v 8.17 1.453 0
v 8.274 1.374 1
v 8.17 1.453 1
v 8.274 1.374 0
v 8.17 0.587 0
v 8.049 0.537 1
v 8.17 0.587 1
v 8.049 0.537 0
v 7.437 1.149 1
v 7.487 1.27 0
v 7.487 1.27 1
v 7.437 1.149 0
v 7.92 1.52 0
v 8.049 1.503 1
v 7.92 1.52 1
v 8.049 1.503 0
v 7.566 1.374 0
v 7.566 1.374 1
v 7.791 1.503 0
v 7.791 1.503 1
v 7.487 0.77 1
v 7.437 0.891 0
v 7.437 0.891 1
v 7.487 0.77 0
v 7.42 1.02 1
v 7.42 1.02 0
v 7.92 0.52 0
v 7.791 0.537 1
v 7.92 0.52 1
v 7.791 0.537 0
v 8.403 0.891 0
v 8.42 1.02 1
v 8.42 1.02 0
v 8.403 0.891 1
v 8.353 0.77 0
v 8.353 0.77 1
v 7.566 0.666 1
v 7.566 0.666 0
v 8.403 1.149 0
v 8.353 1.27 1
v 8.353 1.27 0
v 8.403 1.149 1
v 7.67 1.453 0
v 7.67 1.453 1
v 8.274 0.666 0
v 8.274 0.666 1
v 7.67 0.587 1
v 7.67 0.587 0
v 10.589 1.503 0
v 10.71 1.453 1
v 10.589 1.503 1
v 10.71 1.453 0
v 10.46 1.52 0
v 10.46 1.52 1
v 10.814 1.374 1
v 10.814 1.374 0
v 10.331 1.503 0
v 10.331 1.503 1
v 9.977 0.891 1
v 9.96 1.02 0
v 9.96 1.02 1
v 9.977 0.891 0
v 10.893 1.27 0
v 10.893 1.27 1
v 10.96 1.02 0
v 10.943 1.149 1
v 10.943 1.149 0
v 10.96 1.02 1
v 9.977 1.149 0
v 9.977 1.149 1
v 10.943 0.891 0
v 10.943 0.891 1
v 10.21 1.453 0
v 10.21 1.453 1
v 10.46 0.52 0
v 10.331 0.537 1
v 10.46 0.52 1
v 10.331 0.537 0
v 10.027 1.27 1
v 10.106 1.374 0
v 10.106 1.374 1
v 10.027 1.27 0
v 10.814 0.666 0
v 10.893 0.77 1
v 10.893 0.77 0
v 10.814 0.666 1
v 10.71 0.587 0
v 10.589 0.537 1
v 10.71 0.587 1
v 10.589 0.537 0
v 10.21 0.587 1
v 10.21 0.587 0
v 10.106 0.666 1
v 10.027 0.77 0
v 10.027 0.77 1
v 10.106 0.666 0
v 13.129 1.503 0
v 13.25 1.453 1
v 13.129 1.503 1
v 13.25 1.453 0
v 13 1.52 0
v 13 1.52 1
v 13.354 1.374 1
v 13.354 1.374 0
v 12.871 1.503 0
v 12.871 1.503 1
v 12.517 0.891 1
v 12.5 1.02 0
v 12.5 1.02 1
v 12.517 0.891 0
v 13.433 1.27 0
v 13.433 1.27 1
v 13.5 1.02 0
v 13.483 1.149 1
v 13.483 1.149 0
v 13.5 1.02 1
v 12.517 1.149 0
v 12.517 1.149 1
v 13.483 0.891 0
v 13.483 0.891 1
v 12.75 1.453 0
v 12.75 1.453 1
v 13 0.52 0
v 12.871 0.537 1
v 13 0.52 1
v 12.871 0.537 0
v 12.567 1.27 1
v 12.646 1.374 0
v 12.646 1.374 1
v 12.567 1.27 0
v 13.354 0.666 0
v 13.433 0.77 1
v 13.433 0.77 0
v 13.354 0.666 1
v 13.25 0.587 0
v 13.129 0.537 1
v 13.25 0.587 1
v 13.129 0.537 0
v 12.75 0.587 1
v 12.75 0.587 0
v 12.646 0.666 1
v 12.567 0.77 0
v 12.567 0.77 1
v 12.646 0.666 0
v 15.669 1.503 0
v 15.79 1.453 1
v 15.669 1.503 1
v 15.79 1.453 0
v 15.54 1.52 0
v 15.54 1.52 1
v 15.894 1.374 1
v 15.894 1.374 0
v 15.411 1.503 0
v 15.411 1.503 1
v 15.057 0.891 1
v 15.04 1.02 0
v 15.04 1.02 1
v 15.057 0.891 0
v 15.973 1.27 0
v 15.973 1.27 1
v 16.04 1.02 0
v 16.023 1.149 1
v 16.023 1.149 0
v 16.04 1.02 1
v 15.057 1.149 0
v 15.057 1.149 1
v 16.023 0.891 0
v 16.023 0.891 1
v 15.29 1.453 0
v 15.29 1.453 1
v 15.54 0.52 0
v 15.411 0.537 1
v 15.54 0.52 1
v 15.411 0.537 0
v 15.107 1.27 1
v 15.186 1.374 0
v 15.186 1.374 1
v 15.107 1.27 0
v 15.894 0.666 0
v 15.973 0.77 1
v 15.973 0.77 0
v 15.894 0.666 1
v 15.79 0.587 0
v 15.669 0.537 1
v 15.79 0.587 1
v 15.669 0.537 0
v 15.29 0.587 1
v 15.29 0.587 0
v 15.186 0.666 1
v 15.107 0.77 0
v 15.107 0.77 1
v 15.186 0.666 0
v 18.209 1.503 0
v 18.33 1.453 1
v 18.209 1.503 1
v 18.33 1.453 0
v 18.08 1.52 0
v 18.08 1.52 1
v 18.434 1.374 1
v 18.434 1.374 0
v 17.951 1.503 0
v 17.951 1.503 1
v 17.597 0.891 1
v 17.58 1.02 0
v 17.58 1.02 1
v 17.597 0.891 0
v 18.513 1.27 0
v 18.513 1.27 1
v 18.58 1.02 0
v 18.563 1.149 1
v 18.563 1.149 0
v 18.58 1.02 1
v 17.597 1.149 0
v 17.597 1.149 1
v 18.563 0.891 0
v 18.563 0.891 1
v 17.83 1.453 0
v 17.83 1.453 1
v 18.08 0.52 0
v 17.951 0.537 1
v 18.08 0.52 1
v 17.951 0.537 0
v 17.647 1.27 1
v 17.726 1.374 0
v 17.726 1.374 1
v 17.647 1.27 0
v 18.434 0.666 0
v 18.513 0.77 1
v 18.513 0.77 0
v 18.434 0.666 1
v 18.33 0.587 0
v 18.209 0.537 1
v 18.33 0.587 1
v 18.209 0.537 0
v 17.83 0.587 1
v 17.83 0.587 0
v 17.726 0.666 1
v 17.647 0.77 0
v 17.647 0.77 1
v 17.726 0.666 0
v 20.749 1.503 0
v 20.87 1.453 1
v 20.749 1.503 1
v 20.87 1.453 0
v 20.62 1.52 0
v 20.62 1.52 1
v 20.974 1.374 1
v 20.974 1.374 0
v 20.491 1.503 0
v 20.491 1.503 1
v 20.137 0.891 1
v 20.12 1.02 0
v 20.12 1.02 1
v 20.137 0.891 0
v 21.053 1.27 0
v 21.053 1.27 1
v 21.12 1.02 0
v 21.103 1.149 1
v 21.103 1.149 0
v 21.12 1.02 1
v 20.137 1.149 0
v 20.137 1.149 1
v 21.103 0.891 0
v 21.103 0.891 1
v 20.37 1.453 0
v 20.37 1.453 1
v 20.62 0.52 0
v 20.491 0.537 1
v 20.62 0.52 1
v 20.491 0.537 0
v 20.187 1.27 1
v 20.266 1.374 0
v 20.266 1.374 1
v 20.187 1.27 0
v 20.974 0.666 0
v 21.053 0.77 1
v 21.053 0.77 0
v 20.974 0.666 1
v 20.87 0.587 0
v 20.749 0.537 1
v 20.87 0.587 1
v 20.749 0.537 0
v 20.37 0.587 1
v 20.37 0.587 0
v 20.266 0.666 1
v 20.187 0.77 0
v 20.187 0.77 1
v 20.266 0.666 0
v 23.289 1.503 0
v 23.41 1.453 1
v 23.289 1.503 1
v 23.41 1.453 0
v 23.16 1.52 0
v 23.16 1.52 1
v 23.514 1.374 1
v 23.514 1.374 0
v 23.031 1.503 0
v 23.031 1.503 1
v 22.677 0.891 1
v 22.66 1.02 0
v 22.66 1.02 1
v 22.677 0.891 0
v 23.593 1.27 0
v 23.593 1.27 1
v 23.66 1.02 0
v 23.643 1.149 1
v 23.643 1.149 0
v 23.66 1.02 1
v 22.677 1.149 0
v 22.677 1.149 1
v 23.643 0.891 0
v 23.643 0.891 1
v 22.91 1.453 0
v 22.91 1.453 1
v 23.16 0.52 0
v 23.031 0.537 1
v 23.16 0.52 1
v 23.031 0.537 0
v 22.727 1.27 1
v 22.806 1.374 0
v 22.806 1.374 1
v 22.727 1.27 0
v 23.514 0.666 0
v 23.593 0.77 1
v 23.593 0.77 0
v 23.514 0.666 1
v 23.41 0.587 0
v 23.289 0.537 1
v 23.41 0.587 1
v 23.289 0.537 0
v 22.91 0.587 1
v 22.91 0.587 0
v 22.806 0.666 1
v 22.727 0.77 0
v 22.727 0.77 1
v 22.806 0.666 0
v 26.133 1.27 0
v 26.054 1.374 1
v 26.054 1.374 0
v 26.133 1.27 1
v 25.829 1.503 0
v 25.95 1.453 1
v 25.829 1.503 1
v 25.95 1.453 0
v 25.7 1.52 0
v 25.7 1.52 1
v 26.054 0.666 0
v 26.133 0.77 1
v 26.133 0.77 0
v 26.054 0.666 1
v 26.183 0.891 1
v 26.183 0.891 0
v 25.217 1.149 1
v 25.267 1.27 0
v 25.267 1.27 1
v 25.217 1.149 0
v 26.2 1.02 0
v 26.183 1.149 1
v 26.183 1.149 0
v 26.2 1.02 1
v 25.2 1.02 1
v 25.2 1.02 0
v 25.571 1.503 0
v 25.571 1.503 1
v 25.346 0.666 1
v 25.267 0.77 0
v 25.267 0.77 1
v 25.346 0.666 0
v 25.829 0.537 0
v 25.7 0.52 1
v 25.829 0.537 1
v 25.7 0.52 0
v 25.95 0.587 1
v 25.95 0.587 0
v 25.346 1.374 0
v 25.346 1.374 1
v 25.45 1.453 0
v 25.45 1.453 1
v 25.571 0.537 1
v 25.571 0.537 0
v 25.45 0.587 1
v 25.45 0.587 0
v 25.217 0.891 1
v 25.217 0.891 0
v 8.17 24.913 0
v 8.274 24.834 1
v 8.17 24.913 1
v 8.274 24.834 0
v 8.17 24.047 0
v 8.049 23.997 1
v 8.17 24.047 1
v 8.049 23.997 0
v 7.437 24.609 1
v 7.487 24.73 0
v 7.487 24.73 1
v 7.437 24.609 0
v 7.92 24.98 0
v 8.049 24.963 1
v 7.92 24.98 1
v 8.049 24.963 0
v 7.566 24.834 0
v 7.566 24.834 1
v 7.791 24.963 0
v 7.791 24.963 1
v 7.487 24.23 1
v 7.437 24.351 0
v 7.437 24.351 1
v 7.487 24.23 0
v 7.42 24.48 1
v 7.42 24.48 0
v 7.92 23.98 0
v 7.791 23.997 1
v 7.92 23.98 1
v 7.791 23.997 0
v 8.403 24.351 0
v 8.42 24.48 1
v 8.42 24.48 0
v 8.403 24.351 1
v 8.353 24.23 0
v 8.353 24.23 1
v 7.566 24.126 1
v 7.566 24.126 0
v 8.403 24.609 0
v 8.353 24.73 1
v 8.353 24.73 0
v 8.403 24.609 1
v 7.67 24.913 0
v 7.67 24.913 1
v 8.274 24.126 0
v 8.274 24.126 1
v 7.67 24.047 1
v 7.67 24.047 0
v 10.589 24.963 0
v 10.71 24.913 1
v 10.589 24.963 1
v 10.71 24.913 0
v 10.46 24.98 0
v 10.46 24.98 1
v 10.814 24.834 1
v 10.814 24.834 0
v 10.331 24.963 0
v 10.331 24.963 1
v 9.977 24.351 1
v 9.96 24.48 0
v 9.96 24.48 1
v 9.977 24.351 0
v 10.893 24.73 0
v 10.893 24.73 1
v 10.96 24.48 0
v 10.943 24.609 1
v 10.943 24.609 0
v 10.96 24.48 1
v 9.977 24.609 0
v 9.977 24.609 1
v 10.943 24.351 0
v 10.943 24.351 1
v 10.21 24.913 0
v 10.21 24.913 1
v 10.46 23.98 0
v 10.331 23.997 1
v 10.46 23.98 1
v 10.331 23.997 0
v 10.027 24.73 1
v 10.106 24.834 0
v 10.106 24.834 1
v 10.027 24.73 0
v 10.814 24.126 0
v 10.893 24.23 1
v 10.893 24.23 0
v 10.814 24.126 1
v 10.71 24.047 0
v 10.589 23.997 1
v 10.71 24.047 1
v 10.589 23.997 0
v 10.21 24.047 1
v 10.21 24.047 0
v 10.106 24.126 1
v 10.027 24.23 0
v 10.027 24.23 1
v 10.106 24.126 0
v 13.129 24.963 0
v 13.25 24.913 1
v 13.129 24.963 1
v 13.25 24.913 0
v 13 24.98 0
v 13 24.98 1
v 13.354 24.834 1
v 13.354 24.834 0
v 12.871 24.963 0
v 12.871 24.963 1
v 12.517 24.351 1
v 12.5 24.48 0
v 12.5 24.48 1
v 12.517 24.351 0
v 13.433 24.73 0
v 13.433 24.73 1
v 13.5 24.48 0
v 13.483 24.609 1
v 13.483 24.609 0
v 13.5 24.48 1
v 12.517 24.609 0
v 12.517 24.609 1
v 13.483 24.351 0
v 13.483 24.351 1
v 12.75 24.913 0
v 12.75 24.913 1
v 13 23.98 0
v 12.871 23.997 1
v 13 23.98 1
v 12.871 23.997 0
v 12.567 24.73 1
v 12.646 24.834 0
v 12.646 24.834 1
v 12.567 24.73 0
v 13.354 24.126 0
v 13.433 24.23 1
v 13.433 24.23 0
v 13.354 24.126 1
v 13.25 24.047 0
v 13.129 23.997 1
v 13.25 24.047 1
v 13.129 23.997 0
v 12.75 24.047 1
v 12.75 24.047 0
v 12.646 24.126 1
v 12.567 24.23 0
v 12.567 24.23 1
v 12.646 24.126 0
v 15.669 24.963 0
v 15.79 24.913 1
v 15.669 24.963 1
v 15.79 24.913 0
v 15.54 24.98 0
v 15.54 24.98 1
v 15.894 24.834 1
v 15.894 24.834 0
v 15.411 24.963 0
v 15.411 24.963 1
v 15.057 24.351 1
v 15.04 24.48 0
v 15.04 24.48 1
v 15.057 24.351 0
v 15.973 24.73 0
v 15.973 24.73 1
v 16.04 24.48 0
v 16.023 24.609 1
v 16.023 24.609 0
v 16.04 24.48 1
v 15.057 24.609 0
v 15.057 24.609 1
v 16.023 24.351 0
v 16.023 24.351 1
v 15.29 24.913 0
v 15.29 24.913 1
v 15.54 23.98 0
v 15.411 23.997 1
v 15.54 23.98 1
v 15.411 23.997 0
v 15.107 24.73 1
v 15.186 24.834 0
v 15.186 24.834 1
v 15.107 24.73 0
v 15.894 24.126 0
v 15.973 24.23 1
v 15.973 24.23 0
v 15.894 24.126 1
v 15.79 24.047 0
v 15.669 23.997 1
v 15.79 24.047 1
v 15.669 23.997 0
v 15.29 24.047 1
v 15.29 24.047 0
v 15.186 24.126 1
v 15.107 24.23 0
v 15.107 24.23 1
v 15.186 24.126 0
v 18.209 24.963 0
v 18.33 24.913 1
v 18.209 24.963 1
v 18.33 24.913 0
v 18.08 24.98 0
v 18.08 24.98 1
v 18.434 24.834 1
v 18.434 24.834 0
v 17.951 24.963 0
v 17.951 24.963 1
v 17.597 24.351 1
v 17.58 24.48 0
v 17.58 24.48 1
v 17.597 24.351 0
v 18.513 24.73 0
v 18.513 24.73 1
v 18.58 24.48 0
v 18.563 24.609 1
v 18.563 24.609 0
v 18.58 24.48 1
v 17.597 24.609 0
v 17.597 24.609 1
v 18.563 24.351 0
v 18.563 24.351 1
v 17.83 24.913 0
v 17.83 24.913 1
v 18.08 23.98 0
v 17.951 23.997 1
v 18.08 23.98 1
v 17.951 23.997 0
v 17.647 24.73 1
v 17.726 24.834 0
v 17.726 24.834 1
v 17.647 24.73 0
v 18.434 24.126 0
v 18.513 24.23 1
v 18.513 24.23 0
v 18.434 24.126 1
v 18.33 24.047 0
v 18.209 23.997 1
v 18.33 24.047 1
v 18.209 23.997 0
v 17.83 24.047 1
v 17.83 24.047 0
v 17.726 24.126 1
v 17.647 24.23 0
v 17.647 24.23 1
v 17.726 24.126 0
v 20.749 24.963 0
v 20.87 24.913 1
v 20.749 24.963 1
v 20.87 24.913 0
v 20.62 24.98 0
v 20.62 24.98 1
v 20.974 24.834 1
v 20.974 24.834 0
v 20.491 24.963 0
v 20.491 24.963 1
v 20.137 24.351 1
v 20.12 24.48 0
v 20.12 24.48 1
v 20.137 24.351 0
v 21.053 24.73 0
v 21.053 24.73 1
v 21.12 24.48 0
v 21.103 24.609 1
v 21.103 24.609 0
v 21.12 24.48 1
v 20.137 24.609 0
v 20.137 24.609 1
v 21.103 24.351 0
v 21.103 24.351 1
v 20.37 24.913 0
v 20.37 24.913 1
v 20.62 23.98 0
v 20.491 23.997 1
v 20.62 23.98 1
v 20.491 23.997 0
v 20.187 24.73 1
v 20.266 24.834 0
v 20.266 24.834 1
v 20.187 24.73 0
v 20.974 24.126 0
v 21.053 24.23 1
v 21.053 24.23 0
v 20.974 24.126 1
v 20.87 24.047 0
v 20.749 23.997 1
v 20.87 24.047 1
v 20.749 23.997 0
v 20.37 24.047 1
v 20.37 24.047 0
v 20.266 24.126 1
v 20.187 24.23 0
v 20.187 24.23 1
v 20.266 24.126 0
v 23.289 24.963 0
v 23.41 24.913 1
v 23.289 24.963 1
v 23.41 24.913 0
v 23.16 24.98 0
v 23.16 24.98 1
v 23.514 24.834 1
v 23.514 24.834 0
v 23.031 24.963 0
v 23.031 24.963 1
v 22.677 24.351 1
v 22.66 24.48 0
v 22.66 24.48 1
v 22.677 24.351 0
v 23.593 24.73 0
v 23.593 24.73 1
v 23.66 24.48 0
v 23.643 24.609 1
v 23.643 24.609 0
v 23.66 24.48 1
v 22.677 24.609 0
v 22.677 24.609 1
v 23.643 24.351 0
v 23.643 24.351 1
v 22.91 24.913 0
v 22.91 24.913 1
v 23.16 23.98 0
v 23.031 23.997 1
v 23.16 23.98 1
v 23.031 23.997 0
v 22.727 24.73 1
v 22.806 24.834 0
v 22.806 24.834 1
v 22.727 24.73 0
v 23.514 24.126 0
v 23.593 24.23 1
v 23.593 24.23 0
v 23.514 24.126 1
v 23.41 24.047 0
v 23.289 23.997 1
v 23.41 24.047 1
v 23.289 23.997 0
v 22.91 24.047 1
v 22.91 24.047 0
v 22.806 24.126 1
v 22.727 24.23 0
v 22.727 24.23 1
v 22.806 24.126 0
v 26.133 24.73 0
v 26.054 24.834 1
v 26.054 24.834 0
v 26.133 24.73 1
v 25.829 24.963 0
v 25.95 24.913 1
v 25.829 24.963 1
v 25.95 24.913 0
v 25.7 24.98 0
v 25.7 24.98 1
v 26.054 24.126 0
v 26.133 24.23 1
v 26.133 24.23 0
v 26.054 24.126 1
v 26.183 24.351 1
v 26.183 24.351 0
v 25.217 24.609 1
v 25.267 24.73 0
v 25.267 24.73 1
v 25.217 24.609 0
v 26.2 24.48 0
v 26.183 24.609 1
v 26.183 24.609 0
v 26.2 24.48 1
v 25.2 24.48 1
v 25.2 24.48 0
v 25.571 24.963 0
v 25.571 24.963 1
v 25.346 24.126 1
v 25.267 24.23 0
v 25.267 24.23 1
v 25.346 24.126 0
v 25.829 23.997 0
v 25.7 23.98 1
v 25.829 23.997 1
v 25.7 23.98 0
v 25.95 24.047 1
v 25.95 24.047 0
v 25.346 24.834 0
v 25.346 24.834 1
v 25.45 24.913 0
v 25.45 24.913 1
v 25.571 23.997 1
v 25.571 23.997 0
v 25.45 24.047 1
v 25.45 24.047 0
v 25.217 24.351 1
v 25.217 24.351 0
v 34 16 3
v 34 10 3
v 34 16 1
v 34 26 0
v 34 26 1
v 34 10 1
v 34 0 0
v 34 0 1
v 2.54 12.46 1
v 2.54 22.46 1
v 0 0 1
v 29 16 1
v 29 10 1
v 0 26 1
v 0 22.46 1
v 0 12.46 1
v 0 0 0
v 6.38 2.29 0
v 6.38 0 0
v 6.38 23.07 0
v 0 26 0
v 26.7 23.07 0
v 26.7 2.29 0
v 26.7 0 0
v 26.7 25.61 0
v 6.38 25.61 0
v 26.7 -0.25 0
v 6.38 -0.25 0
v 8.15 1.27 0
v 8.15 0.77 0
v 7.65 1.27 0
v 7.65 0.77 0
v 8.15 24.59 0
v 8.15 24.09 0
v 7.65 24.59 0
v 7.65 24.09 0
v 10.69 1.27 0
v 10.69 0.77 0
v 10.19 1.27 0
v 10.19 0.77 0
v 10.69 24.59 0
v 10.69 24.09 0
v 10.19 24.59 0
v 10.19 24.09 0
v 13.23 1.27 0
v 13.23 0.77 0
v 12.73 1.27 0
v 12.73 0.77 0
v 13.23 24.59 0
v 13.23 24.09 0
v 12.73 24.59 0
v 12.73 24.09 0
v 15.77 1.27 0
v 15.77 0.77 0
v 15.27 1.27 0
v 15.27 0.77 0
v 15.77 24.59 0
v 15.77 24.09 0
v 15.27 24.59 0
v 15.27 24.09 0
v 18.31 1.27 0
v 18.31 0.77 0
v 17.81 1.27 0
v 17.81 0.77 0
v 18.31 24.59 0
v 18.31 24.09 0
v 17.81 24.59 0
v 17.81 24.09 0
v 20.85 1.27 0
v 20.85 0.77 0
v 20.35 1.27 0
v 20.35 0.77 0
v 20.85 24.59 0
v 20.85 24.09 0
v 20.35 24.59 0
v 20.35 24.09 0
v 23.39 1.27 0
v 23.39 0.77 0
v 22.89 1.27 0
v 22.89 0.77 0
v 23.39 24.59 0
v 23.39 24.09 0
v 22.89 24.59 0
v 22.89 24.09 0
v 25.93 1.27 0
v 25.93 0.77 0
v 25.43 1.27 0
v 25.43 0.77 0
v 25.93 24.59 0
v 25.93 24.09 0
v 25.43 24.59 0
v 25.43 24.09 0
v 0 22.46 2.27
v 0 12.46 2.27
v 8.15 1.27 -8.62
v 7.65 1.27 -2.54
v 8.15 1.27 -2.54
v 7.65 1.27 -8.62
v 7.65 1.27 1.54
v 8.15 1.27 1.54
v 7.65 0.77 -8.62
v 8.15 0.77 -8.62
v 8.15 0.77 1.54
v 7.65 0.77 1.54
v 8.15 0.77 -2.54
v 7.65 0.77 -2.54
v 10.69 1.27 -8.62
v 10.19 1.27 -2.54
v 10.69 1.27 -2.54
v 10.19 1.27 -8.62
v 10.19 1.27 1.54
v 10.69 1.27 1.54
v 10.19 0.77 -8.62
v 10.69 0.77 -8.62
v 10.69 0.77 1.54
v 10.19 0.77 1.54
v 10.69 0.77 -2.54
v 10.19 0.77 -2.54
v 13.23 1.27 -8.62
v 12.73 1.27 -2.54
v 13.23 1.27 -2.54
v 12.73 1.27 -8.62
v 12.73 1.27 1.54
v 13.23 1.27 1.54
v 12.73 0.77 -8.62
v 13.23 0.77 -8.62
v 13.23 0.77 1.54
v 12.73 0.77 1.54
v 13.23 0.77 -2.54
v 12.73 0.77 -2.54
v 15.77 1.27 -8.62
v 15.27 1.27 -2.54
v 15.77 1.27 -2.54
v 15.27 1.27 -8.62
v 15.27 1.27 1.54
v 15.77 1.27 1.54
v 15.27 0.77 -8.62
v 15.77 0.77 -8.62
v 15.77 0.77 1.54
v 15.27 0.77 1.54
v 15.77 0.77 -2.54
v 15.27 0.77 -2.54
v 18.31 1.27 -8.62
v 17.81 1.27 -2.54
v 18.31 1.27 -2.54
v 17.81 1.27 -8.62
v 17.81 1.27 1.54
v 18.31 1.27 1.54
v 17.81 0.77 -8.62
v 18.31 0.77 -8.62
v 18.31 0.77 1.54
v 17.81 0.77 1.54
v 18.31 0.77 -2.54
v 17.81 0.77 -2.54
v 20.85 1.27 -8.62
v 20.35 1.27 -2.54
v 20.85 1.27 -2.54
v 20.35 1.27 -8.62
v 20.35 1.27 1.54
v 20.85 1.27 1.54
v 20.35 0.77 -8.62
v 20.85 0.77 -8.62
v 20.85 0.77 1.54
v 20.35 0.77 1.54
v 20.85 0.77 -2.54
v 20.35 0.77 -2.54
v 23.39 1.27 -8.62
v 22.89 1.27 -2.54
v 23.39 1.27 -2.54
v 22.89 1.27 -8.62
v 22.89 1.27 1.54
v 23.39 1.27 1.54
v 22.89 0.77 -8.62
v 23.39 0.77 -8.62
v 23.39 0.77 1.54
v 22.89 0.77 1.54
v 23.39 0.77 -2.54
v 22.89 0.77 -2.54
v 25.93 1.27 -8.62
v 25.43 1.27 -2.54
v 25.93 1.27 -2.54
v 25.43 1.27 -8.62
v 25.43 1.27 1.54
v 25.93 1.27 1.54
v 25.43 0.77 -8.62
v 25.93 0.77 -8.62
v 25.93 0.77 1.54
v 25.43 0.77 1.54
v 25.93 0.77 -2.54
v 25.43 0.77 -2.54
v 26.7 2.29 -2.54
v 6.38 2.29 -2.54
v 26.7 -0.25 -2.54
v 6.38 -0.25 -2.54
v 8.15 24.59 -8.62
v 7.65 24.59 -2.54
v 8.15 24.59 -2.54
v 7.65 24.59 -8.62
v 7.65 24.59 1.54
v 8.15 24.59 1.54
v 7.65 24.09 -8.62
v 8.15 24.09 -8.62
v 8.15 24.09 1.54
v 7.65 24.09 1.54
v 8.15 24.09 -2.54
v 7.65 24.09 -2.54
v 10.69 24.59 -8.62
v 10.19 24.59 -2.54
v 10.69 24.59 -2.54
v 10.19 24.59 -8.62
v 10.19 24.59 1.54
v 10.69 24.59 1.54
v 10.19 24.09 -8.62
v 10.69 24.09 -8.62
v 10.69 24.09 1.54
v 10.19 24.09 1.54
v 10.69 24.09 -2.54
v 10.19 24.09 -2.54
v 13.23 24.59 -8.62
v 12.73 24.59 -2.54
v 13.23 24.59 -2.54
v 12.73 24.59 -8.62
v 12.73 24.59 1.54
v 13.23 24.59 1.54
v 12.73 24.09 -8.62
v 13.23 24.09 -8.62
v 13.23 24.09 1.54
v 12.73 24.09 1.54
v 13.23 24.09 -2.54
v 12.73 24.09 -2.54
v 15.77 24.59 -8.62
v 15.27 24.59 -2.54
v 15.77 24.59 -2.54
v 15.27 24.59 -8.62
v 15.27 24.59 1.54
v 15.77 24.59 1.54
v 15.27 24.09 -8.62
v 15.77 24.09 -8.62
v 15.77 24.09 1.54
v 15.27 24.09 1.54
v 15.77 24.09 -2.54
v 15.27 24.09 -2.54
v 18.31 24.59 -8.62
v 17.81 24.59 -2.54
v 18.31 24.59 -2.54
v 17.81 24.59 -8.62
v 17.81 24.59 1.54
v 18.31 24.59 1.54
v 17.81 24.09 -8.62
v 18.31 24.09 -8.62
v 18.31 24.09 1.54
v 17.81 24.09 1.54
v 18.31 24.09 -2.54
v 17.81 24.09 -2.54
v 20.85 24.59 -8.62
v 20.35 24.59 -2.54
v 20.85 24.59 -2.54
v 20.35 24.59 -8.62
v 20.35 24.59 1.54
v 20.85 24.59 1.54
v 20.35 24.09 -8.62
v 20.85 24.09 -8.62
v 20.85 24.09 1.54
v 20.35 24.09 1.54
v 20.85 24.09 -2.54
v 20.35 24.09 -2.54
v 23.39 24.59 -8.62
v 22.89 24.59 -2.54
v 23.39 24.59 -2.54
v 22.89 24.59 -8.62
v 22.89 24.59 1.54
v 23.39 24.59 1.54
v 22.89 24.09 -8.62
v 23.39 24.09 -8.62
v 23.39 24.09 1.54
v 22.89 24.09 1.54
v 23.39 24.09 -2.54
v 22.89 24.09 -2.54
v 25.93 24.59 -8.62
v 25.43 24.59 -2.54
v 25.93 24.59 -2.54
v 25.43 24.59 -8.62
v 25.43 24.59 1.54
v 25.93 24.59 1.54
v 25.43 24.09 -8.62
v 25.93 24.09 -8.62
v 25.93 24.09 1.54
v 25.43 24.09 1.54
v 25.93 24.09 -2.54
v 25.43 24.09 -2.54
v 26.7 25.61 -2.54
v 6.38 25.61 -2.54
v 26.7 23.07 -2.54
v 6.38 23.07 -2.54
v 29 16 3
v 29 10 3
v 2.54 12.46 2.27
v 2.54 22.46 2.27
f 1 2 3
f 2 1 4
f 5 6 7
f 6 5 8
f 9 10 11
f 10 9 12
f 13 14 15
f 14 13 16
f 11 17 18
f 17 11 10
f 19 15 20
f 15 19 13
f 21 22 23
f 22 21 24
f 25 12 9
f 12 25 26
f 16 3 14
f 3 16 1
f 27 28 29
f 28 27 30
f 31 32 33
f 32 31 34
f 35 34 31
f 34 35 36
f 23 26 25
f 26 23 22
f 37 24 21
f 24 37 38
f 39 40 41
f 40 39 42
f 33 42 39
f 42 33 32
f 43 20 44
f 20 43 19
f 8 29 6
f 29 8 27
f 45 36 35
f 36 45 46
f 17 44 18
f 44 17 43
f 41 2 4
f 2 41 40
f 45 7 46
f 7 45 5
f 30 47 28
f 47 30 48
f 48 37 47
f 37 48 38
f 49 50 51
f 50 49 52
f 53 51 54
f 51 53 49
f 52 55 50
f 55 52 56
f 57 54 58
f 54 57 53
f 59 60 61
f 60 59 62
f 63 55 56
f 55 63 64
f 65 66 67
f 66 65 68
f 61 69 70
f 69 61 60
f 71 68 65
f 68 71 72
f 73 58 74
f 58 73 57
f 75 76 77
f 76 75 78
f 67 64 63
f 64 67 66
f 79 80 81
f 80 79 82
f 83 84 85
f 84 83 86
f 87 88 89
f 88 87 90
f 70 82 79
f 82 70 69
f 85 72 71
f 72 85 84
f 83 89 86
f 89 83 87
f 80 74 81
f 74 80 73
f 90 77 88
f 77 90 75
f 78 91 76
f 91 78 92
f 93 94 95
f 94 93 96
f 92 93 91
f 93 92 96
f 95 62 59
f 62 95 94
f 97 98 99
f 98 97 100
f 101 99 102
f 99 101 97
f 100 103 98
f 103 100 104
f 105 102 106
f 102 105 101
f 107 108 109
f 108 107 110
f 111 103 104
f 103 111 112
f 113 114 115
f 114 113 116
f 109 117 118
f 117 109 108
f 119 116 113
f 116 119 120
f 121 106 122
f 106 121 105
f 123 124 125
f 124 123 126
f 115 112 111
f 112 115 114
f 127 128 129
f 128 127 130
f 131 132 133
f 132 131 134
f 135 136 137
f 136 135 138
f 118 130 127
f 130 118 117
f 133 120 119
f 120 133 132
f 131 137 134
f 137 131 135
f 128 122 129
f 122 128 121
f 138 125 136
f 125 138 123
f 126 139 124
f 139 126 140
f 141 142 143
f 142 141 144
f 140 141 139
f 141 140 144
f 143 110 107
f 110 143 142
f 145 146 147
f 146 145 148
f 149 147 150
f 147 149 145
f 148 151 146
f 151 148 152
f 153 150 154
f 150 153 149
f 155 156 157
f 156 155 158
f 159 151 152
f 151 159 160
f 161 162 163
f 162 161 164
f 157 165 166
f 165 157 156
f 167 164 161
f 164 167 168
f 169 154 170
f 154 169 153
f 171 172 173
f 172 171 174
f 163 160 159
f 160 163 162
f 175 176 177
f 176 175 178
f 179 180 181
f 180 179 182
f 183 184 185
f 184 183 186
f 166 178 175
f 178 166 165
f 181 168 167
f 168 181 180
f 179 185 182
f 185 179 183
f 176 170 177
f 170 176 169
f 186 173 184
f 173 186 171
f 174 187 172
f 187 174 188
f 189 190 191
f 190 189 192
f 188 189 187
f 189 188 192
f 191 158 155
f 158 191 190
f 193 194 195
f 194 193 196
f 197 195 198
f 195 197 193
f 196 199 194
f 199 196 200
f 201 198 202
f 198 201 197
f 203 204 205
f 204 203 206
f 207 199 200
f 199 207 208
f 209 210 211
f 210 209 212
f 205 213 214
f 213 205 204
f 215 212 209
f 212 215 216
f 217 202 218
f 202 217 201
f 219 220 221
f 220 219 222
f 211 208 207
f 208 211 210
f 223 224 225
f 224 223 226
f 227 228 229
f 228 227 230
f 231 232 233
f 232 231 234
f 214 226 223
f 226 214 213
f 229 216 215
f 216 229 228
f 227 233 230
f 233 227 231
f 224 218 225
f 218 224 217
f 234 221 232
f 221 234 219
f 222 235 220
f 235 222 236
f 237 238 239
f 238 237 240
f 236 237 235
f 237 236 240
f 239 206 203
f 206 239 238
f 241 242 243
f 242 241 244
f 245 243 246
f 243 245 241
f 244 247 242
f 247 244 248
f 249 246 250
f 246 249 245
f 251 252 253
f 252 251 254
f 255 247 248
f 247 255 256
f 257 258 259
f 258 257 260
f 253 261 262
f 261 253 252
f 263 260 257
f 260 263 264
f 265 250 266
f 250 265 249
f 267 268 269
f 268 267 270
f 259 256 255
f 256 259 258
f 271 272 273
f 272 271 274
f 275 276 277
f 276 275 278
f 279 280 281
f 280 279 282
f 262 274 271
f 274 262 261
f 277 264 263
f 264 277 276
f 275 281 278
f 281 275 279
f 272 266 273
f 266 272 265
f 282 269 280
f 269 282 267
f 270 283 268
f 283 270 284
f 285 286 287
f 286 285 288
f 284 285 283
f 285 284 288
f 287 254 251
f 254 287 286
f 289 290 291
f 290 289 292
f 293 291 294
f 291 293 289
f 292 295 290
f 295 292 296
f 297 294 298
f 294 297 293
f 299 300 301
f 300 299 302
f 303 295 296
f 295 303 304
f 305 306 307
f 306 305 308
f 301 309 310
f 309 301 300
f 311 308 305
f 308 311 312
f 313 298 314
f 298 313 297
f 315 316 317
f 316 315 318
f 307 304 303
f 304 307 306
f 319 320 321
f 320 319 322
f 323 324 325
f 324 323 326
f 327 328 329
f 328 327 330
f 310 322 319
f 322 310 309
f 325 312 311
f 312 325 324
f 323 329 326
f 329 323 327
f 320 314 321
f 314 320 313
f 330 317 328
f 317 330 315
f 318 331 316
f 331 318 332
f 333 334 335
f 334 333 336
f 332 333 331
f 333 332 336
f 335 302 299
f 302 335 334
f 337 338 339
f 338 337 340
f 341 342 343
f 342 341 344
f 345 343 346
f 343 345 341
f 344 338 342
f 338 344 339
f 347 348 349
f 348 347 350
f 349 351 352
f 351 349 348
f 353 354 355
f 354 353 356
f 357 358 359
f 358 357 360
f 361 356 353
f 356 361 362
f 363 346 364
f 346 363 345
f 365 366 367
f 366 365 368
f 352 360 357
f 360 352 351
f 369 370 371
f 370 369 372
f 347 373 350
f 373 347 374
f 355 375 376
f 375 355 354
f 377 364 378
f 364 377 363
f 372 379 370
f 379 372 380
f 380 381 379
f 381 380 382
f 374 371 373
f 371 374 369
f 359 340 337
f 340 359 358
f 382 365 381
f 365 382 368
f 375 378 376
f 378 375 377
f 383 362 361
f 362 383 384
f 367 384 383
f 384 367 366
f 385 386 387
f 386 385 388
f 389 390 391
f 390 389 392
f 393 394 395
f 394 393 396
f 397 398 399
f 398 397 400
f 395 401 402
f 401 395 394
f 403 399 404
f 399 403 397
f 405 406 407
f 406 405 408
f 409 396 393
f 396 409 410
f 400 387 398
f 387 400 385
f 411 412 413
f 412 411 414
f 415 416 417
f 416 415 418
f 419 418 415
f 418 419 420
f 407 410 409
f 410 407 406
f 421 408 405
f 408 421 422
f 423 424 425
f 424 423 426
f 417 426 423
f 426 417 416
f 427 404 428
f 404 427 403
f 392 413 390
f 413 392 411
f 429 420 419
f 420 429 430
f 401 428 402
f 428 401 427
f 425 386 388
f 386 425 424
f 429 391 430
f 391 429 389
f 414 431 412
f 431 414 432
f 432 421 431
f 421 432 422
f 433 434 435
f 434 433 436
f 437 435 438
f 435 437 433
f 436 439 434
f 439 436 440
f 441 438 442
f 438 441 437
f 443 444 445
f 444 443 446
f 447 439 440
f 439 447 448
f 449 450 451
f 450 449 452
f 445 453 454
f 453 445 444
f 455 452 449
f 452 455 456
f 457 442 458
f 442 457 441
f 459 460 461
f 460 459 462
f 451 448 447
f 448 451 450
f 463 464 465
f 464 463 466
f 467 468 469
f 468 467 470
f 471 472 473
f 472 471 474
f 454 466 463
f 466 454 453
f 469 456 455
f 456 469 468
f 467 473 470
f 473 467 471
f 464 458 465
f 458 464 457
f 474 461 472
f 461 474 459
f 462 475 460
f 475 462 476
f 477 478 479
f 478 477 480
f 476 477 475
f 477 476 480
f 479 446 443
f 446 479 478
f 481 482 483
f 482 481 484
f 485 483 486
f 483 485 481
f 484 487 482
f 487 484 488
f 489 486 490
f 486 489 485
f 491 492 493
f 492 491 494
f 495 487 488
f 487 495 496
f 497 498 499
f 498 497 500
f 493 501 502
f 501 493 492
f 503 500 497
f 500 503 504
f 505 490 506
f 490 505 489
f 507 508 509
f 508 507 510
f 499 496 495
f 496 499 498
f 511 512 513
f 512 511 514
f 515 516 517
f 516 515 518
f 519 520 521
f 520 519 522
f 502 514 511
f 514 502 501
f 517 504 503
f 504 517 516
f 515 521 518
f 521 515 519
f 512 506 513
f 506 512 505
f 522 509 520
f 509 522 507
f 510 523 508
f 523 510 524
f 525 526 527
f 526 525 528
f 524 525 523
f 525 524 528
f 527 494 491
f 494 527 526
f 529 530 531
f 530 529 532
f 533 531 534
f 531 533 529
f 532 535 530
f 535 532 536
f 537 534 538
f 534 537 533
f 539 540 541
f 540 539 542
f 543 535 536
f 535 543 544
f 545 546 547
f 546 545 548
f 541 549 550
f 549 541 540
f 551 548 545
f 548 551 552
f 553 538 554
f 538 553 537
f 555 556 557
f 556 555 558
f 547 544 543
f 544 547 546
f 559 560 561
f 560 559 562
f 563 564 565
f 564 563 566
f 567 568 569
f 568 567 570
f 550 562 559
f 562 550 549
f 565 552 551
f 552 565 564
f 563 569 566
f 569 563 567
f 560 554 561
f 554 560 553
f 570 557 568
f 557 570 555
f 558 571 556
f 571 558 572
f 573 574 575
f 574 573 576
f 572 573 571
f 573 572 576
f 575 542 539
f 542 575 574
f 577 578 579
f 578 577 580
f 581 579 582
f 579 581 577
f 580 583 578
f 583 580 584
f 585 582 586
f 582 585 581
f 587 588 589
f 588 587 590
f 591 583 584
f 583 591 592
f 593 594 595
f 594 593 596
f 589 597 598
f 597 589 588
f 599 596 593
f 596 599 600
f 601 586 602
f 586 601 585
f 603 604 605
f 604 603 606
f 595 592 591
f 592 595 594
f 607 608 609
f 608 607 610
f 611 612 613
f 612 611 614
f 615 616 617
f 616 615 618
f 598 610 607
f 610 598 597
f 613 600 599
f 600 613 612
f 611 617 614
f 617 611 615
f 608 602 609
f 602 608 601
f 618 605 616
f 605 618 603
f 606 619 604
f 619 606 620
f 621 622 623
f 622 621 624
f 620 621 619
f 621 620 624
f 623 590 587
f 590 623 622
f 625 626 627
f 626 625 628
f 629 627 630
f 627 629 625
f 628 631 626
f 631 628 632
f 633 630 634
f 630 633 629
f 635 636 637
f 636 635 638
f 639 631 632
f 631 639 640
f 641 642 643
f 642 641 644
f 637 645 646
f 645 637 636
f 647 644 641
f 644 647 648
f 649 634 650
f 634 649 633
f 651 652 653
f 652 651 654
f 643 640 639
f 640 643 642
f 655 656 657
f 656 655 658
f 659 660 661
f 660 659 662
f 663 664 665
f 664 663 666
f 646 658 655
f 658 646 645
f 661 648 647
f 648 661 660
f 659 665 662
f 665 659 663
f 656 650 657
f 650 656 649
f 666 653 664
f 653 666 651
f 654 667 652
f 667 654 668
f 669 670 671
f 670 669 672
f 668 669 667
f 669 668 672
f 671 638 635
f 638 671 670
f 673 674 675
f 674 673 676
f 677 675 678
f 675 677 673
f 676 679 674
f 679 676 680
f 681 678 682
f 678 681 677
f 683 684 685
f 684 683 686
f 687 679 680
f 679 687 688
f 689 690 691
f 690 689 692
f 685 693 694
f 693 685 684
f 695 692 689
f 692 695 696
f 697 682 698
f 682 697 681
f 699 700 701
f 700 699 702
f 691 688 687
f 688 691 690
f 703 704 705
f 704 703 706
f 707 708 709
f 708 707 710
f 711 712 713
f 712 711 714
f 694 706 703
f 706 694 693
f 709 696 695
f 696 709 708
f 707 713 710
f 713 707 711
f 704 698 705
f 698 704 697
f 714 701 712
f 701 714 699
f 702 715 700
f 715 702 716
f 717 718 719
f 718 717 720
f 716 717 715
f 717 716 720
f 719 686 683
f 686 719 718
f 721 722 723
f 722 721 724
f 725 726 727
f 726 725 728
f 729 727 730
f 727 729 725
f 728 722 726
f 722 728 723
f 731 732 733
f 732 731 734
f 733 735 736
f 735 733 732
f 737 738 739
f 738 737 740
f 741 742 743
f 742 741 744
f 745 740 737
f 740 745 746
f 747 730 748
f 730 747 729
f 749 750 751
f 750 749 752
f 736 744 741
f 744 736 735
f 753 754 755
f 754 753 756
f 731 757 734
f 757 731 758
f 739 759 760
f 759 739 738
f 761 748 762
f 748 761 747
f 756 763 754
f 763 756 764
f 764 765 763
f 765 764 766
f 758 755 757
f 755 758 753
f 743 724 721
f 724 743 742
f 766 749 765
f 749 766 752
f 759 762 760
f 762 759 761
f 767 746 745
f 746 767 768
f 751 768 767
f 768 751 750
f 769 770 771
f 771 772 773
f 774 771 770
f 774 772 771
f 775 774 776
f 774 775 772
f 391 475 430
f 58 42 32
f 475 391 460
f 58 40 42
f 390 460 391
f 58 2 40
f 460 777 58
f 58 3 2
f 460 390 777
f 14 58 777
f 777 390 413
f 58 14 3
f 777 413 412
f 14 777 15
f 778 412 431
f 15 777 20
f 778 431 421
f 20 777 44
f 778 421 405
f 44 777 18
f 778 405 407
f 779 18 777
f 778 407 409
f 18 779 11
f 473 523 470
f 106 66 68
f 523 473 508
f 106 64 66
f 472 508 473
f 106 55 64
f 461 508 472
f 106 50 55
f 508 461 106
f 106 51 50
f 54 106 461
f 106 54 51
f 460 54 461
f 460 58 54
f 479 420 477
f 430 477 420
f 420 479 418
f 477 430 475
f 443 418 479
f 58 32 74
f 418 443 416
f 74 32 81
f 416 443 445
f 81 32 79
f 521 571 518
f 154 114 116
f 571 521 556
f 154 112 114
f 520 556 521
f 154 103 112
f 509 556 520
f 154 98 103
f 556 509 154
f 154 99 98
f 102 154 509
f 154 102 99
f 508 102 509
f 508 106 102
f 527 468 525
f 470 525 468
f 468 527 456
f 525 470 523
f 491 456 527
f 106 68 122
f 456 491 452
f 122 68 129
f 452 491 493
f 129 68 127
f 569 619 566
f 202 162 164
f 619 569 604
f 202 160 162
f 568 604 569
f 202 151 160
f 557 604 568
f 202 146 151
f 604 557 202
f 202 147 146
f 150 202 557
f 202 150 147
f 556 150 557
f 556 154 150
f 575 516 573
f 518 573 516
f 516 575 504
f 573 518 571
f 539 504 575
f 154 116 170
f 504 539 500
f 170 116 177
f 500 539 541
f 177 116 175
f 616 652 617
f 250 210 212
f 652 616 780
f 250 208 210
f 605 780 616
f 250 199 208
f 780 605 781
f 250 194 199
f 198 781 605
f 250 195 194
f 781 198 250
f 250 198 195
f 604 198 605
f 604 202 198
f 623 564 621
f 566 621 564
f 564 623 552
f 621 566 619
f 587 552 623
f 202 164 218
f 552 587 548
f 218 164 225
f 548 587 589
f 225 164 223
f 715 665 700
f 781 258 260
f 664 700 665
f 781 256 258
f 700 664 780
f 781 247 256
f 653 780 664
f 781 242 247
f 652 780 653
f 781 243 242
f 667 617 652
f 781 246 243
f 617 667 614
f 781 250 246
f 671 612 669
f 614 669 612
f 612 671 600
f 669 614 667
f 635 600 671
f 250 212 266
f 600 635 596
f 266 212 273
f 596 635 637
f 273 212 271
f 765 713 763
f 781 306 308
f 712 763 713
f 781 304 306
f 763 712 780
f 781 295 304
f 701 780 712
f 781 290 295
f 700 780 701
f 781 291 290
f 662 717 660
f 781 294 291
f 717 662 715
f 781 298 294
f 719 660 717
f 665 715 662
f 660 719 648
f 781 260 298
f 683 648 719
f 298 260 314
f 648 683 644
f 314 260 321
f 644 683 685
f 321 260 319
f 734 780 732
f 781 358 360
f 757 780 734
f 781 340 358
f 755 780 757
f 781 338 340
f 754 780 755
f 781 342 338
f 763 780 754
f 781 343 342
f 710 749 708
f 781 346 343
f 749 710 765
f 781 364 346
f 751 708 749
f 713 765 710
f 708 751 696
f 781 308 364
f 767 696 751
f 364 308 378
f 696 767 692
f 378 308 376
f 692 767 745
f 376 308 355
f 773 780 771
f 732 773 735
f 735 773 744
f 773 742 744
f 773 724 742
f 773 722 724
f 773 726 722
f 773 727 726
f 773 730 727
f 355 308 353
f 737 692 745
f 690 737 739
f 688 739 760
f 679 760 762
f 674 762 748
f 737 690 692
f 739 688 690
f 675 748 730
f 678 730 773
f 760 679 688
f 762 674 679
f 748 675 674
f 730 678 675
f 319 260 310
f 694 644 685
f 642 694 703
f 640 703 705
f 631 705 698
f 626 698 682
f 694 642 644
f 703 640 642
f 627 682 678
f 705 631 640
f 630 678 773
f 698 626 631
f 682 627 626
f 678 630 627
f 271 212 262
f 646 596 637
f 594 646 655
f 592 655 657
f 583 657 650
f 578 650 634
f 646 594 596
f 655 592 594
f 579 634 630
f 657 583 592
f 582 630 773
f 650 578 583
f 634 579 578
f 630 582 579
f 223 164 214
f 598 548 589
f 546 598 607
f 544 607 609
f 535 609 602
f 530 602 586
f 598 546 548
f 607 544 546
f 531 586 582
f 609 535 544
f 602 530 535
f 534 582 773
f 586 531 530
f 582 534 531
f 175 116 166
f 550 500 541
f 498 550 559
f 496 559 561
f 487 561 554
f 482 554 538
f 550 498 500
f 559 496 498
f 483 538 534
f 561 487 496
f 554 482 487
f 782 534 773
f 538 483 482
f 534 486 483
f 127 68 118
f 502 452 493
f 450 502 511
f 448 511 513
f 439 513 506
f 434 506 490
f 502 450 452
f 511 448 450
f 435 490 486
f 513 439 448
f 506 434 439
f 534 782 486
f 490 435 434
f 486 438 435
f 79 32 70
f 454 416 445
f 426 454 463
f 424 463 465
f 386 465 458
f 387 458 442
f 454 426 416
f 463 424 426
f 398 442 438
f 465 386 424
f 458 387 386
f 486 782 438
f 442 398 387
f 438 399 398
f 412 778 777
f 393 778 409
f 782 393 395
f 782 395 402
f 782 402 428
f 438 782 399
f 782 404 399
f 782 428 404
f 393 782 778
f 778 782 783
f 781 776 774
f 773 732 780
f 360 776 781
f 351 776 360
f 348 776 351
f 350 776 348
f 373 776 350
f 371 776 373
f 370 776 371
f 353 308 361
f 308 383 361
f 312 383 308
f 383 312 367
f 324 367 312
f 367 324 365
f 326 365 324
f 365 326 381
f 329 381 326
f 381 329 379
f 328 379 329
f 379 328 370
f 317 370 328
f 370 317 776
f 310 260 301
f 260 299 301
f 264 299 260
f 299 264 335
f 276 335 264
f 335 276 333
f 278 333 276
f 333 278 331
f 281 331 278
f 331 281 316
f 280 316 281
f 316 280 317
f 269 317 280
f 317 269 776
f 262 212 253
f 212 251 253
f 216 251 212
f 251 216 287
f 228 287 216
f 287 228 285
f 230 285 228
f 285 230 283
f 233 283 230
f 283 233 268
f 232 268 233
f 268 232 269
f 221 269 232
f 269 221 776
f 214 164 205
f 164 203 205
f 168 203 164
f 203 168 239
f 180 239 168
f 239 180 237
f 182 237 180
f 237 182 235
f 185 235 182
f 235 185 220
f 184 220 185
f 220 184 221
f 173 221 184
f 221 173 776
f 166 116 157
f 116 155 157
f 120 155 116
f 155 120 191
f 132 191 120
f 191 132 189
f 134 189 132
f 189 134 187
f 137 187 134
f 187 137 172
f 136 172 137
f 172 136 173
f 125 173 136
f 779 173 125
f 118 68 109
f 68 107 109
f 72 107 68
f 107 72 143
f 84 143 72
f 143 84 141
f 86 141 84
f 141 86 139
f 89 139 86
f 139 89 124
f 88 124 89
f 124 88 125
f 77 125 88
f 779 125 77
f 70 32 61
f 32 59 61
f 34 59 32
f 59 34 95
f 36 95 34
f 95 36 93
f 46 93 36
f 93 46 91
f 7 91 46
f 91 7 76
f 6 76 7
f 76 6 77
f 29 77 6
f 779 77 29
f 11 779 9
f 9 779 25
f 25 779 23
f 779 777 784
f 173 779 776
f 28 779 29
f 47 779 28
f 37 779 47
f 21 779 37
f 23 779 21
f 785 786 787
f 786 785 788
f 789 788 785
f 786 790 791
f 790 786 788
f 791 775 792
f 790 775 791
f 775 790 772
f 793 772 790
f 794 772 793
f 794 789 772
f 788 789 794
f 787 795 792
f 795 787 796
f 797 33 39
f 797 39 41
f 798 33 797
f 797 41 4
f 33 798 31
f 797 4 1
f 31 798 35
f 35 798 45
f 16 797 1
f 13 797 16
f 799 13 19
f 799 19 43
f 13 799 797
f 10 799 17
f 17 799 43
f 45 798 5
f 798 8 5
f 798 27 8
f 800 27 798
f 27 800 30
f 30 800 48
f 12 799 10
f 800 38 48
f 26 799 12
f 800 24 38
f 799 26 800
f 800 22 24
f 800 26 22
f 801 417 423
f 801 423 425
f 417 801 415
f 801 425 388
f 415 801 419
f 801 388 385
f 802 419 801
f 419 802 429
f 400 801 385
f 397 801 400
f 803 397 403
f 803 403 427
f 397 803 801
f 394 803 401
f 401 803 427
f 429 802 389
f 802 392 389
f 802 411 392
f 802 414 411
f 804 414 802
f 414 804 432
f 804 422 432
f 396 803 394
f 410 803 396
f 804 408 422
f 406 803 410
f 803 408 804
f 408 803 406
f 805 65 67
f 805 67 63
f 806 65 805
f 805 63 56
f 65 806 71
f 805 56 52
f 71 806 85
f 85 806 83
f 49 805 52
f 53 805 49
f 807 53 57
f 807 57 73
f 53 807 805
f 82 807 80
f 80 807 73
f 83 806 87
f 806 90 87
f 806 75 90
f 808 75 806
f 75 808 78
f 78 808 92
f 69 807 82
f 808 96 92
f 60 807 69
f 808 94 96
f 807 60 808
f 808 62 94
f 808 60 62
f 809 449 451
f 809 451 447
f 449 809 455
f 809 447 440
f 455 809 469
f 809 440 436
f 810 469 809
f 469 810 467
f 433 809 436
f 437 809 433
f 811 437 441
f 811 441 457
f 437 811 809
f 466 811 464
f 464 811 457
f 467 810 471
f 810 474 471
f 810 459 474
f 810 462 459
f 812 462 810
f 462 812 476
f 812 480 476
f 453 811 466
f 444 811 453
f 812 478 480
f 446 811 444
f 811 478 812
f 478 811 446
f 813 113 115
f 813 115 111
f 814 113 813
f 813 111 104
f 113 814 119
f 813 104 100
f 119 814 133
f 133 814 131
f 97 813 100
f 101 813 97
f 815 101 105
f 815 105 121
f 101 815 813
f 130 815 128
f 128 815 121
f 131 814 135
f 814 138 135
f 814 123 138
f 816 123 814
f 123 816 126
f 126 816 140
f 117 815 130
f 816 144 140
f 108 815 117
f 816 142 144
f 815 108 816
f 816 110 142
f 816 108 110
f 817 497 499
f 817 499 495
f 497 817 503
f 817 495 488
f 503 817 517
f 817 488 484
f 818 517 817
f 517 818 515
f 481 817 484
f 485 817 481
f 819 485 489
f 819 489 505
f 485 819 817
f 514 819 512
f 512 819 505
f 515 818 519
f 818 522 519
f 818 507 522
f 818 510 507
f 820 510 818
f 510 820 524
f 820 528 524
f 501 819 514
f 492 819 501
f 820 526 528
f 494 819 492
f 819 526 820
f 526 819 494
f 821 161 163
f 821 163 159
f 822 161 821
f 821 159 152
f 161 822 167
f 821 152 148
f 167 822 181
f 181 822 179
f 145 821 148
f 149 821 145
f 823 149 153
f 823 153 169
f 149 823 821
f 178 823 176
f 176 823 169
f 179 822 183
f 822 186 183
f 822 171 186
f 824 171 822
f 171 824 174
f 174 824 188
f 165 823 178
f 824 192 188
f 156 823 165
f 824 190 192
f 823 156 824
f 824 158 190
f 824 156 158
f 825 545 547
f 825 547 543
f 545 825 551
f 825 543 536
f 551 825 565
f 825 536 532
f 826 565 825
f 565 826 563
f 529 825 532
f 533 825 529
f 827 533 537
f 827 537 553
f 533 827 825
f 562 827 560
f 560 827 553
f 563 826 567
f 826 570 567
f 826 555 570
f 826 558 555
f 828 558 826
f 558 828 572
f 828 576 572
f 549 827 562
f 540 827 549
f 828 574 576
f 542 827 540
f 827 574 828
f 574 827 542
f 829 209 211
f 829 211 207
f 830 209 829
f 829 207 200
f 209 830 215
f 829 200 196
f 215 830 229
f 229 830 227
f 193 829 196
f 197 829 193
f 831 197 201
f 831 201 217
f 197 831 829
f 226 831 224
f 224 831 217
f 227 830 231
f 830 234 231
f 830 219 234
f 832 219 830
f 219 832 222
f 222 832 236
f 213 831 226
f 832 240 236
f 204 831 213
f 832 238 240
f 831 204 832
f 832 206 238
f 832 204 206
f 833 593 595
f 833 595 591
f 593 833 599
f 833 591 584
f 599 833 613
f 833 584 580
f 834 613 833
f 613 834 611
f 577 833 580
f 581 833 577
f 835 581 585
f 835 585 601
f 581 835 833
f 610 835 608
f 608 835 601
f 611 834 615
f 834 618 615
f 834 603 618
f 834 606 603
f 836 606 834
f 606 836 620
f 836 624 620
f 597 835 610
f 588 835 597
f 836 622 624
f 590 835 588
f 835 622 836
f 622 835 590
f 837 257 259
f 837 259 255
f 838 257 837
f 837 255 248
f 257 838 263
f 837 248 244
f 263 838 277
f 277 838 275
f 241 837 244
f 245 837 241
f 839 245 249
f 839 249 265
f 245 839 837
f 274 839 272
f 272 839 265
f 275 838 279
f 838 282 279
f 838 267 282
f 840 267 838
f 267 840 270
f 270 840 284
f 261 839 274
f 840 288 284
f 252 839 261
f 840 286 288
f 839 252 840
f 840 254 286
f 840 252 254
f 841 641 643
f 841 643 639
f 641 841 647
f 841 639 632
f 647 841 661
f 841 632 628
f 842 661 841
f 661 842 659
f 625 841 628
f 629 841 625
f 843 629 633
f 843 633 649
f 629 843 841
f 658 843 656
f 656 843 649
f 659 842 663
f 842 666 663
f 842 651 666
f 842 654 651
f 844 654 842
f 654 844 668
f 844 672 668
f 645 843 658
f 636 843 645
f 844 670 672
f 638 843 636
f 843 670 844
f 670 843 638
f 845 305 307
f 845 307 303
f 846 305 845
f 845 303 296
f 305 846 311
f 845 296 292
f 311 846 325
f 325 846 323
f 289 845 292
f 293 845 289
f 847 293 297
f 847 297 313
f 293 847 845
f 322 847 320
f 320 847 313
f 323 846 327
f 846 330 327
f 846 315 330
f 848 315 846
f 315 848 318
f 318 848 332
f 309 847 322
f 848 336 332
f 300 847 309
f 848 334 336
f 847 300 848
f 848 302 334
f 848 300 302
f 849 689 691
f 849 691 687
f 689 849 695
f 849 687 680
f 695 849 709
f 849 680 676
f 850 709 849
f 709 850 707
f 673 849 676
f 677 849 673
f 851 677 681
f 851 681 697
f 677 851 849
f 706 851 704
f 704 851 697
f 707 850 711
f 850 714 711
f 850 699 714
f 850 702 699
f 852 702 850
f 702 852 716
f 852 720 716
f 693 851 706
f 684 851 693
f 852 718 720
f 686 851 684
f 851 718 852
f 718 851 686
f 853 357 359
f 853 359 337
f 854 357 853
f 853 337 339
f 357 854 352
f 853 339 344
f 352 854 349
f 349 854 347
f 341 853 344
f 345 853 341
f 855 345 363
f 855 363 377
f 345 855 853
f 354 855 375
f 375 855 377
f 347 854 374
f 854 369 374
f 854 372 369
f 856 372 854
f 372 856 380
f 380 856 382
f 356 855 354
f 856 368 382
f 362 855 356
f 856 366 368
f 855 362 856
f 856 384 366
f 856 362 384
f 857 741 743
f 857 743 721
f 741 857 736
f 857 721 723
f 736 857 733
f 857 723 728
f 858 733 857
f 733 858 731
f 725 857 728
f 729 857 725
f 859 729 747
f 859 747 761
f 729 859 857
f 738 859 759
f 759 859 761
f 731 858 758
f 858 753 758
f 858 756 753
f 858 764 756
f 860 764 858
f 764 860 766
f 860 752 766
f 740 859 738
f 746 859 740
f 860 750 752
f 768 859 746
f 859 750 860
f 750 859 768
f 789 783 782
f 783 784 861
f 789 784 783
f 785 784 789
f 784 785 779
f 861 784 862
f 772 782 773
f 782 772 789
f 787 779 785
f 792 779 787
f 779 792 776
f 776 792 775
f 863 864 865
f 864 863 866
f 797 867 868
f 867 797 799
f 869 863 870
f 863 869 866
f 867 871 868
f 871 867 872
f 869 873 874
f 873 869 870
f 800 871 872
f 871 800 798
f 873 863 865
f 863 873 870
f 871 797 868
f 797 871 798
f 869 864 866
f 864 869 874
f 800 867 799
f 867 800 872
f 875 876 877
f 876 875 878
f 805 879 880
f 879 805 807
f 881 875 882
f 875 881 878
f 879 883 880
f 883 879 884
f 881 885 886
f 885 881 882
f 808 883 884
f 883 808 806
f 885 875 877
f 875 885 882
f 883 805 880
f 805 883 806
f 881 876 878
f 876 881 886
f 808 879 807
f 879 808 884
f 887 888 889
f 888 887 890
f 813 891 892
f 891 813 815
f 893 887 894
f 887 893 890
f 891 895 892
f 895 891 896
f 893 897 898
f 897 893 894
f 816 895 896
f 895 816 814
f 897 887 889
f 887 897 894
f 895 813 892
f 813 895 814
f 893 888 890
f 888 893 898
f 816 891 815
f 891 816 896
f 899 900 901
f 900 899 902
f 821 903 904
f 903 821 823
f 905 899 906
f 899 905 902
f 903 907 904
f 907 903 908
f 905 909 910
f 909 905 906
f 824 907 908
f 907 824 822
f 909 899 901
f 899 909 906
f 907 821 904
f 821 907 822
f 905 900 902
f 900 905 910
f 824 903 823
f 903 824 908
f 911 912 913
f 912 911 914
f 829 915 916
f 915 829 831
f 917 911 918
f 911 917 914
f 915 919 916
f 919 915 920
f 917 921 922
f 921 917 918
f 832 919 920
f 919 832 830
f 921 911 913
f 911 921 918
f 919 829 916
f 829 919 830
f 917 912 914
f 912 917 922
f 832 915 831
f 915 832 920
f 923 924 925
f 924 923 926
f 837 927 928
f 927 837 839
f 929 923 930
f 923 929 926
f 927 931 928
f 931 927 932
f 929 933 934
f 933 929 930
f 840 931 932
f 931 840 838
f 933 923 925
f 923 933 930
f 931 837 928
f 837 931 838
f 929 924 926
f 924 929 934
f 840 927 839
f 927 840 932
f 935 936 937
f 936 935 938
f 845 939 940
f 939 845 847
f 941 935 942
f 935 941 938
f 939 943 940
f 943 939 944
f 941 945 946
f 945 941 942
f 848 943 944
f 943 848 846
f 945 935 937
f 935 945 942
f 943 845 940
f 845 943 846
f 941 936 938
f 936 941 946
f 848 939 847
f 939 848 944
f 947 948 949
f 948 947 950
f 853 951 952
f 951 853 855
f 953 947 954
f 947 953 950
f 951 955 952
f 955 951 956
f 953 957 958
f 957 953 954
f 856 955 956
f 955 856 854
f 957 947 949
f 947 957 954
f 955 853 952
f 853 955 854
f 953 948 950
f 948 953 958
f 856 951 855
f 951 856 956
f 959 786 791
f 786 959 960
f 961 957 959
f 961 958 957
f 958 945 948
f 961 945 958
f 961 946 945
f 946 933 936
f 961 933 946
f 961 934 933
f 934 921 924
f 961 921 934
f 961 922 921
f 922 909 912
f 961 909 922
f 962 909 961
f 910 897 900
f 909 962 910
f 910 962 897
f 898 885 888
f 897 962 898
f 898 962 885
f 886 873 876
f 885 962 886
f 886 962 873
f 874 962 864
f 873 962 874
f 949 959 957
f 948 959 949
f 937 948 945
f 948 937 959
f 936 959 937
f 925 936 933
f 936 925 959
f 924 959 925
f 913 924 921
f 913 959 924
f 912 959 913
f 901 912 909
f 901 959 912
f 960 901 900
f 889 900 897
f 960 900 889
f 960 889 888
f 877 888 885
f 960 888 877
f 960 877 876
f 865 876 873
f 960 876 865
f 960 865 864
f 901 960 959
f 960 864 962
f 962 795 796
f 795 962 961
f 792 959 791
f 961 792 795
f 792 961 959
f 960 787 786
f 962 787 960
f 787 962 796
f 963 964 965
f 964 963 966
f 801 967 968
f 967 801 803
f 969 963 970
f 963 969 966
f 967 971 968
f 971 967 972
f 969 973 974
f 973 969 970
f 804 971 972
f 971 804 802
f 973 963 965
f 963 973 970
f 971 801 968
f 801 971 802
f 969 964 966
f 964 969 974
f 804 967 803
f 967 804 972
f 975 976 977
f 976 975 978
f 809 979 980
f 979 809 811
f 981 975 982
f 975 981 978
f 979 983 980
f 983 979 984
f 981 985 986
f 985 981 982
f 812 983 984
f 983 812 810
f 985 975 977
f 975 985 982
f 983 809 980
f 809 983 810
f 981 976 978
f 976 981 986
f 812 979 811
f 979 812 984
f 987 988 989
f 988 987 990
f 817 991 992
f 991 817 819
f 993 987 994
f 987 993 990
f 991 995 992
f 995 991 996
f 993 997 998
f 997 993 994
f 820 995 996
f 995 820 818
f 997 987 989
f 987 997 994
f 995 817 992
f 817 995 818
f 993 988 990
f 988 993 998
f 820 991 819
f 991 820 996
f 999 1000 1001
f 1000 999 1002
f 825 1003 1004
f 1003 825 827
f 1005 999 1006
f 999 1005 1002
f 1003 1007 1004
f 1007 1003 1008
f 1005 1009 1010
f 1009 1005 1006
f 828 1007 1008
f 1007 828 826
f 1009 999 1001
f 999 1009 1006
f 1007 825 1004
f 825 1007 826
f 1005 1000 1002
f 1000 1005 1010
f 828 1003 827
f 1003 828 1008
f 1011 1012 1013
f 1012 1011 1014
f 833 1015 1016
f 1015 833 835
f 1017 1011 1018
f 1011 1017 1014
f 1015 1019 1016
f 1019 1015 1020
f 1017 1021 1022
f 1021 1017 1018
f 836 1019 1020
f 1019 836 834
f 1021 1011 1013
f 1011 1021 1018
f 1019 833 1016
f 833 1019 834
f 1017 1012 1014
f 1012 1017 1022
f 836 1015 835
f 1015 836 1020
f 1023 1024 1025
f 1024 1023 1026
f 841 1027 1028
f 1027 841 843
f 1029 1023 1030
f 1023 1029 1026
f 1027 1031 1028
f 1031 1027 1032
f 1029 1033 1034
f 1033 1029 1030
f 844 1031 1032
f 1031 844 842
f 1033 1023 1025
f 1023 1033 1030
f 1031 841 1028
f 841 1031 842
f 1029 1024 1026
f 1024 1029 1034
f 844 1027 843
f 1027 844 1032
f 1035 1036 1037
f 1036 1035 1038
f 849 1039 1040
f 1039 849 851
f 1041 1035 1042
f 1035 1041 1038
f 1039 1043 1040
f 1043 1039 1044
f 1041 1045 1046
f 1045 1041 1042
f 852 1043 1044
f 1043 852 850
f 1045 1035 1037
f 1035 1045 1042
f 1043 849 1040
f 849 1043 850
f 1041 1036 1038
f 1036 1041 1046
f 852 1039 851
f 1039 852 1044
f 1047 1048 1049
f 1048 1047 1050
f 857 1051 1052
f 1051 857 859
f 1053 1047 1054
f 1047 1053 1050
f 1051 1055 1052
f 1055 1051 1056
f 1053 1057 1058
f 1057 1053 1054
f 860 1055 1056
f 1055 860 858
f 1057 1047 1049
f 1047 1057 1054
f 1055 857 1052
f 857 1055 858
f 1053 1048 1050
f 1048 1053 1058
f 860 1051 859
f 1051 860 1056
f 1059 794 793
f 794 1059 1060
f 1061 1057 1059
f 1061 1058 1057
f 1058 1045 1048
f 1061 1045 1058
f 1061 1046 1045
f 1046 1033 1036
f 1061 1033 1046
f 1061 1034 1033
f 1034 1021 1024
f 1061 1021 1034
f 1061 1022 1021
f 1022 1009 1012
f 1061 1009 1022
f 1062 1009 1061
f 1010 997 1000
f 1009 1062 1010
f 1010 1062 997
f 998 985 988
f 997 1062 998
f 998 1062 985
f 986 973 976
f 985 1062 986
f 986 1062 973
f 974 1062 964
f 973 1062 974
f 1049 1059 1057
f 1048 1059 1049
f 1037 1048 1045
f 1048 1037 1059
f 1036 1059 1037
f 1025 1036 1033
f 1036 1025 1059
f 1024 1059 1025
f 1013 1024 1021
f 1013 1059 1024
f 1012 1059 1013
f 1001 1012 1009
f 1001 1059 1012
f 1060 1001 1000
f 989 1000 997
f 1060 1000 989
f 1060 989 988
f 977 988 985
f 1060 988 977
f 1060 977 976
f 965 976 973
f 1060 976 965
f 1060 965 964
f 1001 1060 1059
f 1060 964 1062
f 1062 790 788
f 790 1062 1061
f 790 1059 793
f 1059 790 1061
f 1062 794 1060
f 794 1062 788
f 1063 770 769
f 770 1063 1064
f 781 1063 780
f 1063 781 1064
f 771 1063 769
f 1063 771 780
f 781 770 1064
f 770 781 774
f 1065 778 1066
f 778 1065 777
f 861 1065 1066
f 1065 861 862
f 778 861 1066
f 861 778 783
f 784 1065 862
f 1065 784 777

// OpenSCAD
// WEMOS D1 mini R2 board (ESP8266F)
pcb_D1 = [34,26, 1];

module female_connectors(d=2.54,w=0.5,n=6){
    union() {
        color("DarkGray") 
        translate([-d,0,d/2])
        cube([d, n*d, d], center=true);
        for (xl = [0: d : (n-1)*d]) {
            translate([-d-w/2, xl-(n-1)*d/2, 1-d])
            color("White") cube([w, w, 4*d]);
        }
    }
}

module wemos_D1_mini_holes(def=pcb_D1,d=2.54,w=0.5,n=8){
    left=[2*d, def[1]/2+d,0];
    rotate([0,180,0])   // upside done
    rotate([0,0,90]) {   // align to pcb_D1[0]
    translate(left) // left
    union() {
        translate([-d/2,d/2,0])
        for (xl = [0: d : (n-1)*d]) {
            translate([-d-w/2, xl-(n-1)*d/2, -d])
            cylinder(h=2*d, r=w, $fn=24);
        }
        translate([def[1]-3*d/2,d/2,0])
        for (xl = [0: d : (n-1)*d]) {
            translate([-d-w/2, xl-(n-1)*d/2, -d])
            cylinder(h=2*d, r=w, $fn=24);
        }
    }
}
}

module wemos_D1_mini(def=pcb_D1,d=2.54,w=0.5,con=false) {
    usb_b = [5,6,3]; // 12,10,5
    color("SteelBlue") difference() {
        cube(pcb_D1);
        wemos_D1_mini_holes();
    }
    if (con == true) {
      left=[2*d, def[1]/2+d,0];
      rotate([0,180,0])   // upside done
      rotate([0,0,90]) {   // align to pcb_D1[0]
      translate(left+[-(d+w)/2, 2*w,0]) // left
      female_connectors(n=8);
      translate(left+[def[0]-5*d+w, 2*w,0]) // right
      female_connectors(n=8);
    }
    }
    // USB connector
    color("Gray") translate([def[0]-usb_b[0], def[1]/2-usb_b[1]/2,0]) cube(usb_b);
    // on board antenna
    color("White") translate([0,def[1]-10-1-d,def[2]]) cube([d,10,d/2]); 
    
}
wemos_D1_mini(con=true);
